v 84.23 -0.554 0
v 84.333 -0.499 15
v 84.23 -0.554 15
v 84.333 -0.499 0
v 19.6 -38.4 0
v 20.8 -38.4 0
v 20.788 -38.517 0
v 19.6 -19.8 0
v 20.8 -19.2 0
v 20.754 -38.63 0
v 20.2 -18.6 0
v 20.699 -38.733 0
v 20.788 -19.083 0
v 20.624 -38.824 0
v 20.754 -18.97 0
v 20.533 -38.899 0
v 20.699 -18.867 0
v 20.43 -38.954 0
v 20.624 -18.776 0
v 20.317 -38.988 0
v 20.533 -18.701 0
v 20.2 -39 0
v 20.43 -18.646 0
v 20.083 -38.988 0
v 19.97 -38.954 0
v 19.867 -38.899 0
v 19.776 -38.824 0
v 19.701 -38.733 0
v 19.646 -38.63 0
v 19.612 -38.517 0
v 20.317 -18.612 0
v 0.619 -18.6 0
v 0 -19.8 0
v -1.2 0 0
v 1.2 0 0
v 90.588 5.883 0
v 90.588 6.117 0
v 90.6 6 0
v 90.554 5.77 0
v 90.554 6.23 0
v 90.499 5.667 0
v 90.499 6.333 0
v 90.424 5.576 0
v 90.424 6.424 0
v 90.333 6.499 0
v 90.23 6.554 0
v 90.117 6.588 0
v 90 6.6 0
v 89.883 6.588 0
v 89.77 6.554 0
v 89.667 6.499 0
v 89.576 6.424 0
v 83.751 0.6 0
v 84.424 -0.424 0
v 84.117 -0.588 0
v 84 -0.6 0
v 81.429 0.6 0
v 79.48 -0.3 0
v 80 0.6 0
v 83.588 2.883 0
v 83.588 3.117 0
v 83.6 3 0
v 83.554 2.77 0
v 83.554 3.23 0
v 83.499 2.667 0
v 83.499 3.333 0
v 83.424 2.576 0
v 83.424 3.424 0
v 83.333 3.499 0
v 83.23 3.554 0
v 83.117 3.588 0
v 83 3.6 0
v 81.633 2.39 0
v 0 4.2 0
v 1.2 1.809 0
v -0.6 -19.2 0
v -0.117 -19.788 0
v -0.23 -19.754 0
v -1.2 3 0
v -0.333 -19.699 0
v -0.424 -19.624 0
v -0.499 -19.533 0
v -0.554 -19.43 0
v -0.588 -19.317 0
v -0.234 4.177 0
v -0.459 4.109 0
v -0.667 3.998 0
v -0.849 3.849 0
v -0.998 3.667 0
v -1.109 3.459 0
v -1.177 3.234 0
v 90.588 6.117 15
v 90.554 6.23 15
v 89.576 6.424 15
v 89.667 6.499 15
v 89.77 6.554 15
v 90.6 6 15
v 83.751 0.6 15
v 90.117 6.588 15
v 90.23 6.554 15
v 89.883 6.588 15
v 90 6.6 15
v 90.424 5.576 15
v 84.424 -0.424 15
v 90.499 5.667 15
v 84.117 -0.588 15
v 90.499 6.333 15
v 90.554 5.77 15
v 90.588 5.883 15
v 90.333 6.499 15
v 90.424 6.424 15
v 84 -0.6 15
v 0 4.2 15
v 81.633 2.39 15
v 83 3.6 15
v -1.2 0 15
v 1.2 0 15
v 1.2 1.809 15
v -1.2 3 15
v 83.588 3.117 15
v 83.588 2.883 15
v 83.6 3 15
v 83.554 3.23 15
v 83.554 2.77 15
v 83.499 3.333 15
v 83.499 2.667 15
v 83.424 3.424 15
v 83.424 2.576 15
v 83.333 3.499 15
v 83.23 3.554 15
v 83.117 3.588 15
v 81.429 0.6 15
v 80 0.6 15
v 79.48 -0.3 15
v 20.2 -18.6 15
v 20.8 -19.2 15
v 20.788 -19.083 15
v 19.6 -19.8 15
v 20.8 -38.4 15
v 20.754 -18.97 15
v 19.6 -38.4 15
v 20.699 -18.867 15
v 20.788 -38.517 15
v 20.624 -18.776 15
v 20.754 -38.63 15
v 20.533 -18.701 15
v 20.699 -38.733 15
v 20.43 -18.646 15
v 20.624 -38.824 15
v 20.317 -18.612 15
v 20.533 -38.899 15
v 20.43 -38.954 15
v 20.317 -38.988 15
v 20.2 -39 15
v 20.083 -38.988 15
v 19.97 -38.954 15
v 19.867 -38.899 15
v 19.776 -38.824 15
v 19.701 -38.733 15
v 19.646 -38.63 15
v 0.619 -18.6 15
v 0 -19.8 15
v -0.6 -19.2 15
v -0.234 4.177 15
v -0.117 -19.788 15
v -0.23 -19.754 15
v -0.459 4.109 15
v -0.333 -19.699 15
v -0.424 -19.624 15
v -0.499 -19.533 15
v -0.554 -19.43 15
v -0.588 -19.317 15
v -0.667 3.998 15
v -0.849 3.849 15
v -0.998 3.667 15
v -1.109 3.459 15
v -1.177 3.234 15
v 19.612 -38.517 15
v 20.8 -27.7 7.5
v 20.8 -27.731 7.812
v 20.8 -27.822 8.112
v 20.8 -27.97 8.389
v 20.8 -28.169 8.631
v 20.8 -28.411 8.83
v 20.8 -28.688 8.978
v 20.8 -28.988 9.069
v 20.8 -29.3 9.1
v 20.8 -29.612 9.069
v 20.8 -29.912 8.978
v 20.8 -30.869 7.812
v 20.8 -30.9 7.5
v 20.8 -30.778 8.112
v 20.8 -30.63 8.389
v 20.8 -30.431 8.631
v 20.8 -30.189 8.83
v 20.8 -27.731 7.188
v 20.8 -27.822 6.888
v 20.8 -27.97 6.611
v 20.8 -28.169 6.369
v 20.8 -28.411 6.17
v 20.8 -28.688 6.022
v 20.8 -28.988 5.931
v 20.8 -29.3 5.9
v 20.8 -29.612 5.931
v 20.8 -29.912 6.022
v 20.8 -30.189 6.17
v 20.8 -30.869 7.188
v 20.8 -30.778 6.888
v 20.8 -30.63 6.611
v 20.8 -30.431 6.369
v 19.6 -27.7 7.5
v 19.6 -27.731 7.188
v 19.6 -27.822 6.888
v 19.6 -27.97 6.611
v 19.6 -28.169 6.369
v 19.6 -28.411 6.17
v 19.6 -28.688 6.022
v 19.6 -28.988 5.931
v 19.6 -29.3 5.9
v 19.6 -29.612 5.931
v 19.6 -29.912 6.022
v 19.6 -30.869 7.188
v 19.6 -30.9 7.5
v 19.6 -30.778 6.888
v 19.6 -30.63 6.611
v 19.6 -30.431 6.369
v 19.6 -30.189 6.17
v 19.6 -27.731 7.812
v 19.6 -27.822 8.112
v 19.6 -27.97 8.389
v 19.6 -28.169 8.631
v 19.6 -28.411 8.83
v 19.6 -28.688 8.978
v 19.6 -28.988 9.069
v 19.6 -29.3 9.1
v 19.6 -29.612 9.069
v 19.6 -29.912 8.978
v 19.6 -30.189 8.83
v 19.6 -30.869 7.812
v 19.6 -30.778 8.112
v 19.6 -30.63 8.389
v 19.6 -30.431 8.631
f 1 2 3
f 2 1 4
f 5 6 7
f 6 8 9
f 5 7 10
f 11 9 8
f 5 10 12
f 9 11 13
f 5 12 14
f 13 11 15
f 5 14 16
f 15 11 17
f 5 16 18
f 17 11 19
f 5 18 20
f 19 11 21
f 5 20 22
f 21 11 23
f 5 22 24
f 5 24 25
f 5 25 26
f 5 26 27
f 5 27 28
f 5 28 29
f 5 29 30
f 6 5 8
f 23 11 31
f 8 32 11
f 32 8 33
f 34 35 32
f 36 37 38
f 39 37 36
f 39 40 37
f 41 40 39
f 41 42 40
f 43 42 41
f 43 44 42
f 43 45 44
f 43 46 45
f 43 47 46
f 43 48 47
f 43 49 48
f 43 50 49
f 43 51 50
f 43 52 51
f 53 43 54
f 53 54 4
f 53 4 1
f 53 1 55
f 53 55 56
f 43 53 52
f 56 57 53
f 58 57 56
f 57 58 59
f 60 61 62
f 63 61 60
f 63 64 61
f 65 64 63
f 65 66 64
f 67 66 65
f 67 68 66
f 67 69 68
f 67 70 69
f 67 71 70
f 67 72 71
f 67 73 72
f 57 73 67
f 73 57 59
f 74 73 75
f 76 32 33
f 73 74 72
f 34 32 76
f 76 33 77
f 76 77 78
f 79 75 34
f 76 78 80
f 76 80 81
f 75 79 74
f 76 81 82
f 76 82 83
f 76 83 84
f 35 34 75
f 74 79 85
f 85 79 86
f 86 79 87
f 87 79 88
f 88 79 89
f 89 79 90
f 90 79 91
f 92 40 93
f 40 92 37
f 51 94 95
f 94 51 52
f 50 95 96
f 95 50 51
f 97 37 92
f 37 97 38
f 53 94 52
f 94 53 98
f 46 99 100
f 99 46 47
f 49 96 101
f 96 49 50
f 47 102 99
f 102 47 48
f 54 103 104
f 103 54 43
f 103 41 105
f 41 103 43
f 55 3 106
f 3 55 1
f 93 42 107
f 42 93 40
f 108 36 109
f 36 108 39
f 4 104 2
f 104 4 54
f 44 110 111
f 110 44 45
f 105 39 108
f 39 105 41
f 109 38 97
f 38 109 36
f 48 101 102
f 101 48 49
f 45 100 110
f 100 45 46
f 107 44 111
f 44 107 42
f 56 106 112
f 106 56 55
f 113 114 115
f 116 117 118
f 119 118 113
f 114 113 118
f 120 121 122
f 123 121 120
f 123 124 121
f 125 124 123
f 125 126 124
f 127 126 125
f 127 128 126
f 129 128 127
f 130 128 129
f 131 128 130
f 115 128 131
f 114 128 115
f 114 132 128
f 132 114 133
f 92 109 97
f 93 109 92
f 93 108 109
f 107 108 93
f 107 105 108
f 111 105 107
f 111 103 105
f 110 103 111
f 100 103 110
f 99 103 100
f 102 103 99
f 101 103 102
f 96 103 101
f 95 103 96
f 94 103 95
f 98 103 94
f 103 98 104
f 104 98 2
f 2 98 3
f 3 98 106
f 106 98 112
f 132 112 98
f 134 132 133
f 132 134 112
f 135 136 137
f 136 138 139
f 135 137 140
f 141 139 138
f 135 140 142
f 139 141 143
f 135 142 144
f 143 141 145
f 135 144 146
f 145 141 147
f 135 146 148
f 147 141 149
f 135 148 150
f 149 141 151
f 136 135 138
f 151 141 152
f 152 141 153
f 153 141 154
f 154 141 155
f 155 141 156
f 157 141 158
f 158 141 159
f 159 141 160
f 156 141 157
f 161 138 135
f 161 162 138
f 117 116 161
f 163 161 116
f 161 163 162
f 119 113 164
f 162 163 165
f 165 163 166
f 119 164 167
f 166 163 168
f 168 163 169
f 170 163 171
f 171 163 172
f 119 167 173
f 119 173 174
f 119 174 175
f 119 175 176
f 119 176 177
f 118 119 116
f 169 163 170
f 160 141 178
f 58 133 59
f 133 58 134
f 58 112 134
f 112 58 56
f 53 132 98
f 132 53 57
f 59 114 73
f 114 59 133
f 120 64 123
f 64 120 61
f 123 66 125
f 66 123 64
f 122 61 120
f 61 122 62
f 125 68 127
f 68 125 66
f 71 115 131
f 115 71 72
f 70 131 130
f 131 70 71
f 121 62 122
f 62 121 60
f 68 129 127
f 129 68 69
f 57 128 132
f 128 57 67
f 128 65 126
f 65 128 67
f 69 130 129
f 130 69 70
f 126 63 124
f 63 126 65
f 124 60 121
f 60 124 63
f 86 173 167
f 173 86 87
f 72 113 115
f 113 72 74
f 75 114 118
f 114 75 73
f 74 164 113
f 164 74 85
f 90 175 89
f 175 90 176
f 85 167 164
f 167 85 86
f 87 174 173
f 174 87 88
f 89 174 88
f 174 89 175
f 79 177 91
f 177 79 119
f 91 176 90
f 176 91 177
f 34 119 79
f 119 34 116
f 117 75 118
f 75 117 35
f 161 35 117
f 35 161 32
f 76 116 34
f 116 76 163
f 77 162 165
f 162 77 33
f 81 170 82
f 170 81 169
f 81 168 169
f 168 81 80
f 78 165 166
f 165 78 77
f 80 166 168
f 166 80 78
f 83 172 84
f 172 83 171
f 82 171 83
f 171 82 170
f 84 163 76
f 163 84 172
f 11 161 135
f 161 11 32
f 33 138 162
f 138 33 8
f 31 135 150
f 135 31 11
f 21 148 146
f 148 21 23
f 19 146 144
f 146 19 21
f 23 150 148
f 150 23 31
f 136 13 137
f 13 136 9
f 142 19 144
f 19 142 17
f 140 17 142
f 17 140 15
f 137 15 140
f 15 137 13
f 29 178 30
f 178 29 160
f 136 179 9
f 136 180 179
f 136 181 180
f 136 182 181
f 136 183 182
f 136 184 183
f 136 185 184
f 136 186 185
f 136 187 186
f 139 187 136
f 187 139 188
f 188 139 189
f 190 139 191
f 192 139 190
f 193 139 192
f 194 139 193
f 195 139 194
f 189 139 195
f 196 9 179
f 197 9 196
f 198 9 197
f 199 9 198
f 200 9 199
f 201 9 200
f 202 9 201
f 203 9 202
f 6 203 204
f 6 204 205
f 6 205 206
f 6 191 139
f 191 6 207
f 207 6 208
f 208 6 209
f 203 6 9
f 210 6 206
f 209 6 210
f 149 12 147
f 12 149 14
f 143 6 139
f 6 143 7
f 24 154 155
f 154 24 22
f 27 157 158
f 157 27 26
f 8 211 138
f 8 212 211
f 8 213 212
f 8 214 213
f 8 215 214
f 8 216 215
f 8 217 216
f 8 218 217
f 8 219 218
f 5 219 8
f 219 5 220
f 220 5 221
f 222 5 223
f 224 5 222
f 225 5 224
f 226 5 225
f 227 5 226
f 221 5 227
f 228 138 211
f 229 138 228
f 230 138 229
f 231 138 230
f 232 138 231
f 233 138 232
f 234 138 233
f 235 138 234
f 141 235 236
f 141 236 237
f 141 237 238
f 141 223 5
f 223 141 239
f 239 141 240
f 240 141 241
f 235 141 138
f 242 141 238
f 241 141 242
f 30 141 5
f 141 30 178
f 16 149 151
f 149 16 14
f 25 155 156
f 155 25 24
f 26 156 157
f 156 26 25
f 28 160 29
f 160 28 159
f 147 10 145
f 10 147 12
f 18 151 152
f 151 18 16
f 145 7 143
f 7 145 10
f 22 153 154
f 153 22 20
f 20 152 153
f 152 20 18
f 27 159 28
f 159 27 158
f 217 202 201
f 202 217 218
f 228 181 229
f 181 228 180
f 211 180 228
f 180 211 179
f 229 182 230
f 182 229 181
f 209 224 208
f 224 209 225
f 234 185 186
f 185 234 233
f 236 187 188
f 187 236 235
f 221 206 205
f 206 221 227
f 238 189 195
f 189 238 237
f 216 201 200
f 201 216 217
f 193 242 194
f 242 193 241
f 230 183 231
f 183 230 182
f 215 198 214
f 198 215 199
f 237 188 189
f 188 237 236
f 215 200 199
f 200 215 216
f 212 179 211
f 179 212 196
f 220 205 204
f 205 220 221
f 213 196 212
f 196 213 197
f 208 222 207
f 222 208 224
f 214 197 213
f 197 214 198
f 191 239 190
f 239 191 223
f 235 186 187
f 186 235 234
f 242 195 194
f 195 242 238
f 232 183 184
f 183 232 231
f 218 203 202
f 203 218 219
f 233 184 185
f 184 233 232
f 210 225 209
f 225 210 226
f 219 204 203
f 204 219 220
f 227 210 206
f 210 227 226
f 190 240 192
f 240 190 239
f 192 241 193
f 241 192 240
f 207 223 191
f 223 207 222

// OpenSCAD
// x, y, rotation
function fwd(X) = [ 0, X, 0];
function side(X) = [ -X, 0,0];
function rot(X) = [ 0, 0, -X];
function rel(X,Y) = [-X,Y,0];

function logo1(li) = logo(li, [0,0,0]);

function sublist(li,off) = (off<len(li))?[ for(i=[off:len(li)-1]) li[i] ]:[];
function stateEval(state,move) = 
    [   state[0] + sin(state[2])*move[0] + cos(state[2])*move[1],
        state[1] + cos(state[2])*move[0] - sin(state[2])*move[1]    ,
        state[2]+move[2]
    ];

function vec2(v) = [v[0],v[1]];

function logo(li,state) =
    0<len(li) ? concat(
               [vec2(stateEval(state,li[0]))],logo(sublist(li,1),stateEval(state,li[0]))
            ) : [];

//function logo(li)

K=50;
S=3;
x=[
    rot(0),fwd(K),side(S),fwd(S),rel(-2*S,2*S),fwd(-3*S)

];
echo(logo1(x));
//linear_extrude()
//polygon(logo1(x));

//echo(sublist(x,0));
//echo(logo([fwd(10),rot(90),fwd(10)]));

//x=[ fwd(1) ];


W=1.2;
Z=3;


A=80;
B=18+W;
C=19+W;
D=18+W;

H=15;


if(false)
difference() {
    union() {
        cube([A,B,H],center=true);
    }
    translate([-W,0,0])
    cube([A,B-2*W,H+1],center=true);
    
}



// FIXME move to a common place
module hullLine() {
    echo($children);
    for(o = [0:$children-2])  {
        hull() {
            children(o+0);
            children(o+1);
        }
    }
}


Q=4;
W2=2*W;
$fn=32;
difference() {
hullLine() {
    translate([A+Q+2*Z,2*Z,0])
    cylinder(d=W,h=H);
    translate([A+Q,0,0])
    cylinder(d=W,h=H);
    translate([A,0,0])
    rotate(-30)
    cylinder($fn=3,d=W,h=H);
    translate([A+Z,Z,0])
    cylinder(d=W,h=H);
    translate([0*A/2,Z,0])
    cylinder(d=W2,h=H);
    translate([0*A/2,0,0])
    cylinder(d=W2,h=H);
    translate([0,0,0])
    cylinder(d=W2,h=H);
    translate([0,-B,0])
    cylinder(d=W,h=H);
    translate([C,-B,0])
    cylinder(d=W,h=H);
    translate([C,-B-D,0])
    cylinder(d=W,h=H);
    
}
translate([C,-B-D/2-.5,H/2])
rotate(90)
rotate(90,[1,0,0])
    cylinder(d=3.2,h=30,center=true);

}
